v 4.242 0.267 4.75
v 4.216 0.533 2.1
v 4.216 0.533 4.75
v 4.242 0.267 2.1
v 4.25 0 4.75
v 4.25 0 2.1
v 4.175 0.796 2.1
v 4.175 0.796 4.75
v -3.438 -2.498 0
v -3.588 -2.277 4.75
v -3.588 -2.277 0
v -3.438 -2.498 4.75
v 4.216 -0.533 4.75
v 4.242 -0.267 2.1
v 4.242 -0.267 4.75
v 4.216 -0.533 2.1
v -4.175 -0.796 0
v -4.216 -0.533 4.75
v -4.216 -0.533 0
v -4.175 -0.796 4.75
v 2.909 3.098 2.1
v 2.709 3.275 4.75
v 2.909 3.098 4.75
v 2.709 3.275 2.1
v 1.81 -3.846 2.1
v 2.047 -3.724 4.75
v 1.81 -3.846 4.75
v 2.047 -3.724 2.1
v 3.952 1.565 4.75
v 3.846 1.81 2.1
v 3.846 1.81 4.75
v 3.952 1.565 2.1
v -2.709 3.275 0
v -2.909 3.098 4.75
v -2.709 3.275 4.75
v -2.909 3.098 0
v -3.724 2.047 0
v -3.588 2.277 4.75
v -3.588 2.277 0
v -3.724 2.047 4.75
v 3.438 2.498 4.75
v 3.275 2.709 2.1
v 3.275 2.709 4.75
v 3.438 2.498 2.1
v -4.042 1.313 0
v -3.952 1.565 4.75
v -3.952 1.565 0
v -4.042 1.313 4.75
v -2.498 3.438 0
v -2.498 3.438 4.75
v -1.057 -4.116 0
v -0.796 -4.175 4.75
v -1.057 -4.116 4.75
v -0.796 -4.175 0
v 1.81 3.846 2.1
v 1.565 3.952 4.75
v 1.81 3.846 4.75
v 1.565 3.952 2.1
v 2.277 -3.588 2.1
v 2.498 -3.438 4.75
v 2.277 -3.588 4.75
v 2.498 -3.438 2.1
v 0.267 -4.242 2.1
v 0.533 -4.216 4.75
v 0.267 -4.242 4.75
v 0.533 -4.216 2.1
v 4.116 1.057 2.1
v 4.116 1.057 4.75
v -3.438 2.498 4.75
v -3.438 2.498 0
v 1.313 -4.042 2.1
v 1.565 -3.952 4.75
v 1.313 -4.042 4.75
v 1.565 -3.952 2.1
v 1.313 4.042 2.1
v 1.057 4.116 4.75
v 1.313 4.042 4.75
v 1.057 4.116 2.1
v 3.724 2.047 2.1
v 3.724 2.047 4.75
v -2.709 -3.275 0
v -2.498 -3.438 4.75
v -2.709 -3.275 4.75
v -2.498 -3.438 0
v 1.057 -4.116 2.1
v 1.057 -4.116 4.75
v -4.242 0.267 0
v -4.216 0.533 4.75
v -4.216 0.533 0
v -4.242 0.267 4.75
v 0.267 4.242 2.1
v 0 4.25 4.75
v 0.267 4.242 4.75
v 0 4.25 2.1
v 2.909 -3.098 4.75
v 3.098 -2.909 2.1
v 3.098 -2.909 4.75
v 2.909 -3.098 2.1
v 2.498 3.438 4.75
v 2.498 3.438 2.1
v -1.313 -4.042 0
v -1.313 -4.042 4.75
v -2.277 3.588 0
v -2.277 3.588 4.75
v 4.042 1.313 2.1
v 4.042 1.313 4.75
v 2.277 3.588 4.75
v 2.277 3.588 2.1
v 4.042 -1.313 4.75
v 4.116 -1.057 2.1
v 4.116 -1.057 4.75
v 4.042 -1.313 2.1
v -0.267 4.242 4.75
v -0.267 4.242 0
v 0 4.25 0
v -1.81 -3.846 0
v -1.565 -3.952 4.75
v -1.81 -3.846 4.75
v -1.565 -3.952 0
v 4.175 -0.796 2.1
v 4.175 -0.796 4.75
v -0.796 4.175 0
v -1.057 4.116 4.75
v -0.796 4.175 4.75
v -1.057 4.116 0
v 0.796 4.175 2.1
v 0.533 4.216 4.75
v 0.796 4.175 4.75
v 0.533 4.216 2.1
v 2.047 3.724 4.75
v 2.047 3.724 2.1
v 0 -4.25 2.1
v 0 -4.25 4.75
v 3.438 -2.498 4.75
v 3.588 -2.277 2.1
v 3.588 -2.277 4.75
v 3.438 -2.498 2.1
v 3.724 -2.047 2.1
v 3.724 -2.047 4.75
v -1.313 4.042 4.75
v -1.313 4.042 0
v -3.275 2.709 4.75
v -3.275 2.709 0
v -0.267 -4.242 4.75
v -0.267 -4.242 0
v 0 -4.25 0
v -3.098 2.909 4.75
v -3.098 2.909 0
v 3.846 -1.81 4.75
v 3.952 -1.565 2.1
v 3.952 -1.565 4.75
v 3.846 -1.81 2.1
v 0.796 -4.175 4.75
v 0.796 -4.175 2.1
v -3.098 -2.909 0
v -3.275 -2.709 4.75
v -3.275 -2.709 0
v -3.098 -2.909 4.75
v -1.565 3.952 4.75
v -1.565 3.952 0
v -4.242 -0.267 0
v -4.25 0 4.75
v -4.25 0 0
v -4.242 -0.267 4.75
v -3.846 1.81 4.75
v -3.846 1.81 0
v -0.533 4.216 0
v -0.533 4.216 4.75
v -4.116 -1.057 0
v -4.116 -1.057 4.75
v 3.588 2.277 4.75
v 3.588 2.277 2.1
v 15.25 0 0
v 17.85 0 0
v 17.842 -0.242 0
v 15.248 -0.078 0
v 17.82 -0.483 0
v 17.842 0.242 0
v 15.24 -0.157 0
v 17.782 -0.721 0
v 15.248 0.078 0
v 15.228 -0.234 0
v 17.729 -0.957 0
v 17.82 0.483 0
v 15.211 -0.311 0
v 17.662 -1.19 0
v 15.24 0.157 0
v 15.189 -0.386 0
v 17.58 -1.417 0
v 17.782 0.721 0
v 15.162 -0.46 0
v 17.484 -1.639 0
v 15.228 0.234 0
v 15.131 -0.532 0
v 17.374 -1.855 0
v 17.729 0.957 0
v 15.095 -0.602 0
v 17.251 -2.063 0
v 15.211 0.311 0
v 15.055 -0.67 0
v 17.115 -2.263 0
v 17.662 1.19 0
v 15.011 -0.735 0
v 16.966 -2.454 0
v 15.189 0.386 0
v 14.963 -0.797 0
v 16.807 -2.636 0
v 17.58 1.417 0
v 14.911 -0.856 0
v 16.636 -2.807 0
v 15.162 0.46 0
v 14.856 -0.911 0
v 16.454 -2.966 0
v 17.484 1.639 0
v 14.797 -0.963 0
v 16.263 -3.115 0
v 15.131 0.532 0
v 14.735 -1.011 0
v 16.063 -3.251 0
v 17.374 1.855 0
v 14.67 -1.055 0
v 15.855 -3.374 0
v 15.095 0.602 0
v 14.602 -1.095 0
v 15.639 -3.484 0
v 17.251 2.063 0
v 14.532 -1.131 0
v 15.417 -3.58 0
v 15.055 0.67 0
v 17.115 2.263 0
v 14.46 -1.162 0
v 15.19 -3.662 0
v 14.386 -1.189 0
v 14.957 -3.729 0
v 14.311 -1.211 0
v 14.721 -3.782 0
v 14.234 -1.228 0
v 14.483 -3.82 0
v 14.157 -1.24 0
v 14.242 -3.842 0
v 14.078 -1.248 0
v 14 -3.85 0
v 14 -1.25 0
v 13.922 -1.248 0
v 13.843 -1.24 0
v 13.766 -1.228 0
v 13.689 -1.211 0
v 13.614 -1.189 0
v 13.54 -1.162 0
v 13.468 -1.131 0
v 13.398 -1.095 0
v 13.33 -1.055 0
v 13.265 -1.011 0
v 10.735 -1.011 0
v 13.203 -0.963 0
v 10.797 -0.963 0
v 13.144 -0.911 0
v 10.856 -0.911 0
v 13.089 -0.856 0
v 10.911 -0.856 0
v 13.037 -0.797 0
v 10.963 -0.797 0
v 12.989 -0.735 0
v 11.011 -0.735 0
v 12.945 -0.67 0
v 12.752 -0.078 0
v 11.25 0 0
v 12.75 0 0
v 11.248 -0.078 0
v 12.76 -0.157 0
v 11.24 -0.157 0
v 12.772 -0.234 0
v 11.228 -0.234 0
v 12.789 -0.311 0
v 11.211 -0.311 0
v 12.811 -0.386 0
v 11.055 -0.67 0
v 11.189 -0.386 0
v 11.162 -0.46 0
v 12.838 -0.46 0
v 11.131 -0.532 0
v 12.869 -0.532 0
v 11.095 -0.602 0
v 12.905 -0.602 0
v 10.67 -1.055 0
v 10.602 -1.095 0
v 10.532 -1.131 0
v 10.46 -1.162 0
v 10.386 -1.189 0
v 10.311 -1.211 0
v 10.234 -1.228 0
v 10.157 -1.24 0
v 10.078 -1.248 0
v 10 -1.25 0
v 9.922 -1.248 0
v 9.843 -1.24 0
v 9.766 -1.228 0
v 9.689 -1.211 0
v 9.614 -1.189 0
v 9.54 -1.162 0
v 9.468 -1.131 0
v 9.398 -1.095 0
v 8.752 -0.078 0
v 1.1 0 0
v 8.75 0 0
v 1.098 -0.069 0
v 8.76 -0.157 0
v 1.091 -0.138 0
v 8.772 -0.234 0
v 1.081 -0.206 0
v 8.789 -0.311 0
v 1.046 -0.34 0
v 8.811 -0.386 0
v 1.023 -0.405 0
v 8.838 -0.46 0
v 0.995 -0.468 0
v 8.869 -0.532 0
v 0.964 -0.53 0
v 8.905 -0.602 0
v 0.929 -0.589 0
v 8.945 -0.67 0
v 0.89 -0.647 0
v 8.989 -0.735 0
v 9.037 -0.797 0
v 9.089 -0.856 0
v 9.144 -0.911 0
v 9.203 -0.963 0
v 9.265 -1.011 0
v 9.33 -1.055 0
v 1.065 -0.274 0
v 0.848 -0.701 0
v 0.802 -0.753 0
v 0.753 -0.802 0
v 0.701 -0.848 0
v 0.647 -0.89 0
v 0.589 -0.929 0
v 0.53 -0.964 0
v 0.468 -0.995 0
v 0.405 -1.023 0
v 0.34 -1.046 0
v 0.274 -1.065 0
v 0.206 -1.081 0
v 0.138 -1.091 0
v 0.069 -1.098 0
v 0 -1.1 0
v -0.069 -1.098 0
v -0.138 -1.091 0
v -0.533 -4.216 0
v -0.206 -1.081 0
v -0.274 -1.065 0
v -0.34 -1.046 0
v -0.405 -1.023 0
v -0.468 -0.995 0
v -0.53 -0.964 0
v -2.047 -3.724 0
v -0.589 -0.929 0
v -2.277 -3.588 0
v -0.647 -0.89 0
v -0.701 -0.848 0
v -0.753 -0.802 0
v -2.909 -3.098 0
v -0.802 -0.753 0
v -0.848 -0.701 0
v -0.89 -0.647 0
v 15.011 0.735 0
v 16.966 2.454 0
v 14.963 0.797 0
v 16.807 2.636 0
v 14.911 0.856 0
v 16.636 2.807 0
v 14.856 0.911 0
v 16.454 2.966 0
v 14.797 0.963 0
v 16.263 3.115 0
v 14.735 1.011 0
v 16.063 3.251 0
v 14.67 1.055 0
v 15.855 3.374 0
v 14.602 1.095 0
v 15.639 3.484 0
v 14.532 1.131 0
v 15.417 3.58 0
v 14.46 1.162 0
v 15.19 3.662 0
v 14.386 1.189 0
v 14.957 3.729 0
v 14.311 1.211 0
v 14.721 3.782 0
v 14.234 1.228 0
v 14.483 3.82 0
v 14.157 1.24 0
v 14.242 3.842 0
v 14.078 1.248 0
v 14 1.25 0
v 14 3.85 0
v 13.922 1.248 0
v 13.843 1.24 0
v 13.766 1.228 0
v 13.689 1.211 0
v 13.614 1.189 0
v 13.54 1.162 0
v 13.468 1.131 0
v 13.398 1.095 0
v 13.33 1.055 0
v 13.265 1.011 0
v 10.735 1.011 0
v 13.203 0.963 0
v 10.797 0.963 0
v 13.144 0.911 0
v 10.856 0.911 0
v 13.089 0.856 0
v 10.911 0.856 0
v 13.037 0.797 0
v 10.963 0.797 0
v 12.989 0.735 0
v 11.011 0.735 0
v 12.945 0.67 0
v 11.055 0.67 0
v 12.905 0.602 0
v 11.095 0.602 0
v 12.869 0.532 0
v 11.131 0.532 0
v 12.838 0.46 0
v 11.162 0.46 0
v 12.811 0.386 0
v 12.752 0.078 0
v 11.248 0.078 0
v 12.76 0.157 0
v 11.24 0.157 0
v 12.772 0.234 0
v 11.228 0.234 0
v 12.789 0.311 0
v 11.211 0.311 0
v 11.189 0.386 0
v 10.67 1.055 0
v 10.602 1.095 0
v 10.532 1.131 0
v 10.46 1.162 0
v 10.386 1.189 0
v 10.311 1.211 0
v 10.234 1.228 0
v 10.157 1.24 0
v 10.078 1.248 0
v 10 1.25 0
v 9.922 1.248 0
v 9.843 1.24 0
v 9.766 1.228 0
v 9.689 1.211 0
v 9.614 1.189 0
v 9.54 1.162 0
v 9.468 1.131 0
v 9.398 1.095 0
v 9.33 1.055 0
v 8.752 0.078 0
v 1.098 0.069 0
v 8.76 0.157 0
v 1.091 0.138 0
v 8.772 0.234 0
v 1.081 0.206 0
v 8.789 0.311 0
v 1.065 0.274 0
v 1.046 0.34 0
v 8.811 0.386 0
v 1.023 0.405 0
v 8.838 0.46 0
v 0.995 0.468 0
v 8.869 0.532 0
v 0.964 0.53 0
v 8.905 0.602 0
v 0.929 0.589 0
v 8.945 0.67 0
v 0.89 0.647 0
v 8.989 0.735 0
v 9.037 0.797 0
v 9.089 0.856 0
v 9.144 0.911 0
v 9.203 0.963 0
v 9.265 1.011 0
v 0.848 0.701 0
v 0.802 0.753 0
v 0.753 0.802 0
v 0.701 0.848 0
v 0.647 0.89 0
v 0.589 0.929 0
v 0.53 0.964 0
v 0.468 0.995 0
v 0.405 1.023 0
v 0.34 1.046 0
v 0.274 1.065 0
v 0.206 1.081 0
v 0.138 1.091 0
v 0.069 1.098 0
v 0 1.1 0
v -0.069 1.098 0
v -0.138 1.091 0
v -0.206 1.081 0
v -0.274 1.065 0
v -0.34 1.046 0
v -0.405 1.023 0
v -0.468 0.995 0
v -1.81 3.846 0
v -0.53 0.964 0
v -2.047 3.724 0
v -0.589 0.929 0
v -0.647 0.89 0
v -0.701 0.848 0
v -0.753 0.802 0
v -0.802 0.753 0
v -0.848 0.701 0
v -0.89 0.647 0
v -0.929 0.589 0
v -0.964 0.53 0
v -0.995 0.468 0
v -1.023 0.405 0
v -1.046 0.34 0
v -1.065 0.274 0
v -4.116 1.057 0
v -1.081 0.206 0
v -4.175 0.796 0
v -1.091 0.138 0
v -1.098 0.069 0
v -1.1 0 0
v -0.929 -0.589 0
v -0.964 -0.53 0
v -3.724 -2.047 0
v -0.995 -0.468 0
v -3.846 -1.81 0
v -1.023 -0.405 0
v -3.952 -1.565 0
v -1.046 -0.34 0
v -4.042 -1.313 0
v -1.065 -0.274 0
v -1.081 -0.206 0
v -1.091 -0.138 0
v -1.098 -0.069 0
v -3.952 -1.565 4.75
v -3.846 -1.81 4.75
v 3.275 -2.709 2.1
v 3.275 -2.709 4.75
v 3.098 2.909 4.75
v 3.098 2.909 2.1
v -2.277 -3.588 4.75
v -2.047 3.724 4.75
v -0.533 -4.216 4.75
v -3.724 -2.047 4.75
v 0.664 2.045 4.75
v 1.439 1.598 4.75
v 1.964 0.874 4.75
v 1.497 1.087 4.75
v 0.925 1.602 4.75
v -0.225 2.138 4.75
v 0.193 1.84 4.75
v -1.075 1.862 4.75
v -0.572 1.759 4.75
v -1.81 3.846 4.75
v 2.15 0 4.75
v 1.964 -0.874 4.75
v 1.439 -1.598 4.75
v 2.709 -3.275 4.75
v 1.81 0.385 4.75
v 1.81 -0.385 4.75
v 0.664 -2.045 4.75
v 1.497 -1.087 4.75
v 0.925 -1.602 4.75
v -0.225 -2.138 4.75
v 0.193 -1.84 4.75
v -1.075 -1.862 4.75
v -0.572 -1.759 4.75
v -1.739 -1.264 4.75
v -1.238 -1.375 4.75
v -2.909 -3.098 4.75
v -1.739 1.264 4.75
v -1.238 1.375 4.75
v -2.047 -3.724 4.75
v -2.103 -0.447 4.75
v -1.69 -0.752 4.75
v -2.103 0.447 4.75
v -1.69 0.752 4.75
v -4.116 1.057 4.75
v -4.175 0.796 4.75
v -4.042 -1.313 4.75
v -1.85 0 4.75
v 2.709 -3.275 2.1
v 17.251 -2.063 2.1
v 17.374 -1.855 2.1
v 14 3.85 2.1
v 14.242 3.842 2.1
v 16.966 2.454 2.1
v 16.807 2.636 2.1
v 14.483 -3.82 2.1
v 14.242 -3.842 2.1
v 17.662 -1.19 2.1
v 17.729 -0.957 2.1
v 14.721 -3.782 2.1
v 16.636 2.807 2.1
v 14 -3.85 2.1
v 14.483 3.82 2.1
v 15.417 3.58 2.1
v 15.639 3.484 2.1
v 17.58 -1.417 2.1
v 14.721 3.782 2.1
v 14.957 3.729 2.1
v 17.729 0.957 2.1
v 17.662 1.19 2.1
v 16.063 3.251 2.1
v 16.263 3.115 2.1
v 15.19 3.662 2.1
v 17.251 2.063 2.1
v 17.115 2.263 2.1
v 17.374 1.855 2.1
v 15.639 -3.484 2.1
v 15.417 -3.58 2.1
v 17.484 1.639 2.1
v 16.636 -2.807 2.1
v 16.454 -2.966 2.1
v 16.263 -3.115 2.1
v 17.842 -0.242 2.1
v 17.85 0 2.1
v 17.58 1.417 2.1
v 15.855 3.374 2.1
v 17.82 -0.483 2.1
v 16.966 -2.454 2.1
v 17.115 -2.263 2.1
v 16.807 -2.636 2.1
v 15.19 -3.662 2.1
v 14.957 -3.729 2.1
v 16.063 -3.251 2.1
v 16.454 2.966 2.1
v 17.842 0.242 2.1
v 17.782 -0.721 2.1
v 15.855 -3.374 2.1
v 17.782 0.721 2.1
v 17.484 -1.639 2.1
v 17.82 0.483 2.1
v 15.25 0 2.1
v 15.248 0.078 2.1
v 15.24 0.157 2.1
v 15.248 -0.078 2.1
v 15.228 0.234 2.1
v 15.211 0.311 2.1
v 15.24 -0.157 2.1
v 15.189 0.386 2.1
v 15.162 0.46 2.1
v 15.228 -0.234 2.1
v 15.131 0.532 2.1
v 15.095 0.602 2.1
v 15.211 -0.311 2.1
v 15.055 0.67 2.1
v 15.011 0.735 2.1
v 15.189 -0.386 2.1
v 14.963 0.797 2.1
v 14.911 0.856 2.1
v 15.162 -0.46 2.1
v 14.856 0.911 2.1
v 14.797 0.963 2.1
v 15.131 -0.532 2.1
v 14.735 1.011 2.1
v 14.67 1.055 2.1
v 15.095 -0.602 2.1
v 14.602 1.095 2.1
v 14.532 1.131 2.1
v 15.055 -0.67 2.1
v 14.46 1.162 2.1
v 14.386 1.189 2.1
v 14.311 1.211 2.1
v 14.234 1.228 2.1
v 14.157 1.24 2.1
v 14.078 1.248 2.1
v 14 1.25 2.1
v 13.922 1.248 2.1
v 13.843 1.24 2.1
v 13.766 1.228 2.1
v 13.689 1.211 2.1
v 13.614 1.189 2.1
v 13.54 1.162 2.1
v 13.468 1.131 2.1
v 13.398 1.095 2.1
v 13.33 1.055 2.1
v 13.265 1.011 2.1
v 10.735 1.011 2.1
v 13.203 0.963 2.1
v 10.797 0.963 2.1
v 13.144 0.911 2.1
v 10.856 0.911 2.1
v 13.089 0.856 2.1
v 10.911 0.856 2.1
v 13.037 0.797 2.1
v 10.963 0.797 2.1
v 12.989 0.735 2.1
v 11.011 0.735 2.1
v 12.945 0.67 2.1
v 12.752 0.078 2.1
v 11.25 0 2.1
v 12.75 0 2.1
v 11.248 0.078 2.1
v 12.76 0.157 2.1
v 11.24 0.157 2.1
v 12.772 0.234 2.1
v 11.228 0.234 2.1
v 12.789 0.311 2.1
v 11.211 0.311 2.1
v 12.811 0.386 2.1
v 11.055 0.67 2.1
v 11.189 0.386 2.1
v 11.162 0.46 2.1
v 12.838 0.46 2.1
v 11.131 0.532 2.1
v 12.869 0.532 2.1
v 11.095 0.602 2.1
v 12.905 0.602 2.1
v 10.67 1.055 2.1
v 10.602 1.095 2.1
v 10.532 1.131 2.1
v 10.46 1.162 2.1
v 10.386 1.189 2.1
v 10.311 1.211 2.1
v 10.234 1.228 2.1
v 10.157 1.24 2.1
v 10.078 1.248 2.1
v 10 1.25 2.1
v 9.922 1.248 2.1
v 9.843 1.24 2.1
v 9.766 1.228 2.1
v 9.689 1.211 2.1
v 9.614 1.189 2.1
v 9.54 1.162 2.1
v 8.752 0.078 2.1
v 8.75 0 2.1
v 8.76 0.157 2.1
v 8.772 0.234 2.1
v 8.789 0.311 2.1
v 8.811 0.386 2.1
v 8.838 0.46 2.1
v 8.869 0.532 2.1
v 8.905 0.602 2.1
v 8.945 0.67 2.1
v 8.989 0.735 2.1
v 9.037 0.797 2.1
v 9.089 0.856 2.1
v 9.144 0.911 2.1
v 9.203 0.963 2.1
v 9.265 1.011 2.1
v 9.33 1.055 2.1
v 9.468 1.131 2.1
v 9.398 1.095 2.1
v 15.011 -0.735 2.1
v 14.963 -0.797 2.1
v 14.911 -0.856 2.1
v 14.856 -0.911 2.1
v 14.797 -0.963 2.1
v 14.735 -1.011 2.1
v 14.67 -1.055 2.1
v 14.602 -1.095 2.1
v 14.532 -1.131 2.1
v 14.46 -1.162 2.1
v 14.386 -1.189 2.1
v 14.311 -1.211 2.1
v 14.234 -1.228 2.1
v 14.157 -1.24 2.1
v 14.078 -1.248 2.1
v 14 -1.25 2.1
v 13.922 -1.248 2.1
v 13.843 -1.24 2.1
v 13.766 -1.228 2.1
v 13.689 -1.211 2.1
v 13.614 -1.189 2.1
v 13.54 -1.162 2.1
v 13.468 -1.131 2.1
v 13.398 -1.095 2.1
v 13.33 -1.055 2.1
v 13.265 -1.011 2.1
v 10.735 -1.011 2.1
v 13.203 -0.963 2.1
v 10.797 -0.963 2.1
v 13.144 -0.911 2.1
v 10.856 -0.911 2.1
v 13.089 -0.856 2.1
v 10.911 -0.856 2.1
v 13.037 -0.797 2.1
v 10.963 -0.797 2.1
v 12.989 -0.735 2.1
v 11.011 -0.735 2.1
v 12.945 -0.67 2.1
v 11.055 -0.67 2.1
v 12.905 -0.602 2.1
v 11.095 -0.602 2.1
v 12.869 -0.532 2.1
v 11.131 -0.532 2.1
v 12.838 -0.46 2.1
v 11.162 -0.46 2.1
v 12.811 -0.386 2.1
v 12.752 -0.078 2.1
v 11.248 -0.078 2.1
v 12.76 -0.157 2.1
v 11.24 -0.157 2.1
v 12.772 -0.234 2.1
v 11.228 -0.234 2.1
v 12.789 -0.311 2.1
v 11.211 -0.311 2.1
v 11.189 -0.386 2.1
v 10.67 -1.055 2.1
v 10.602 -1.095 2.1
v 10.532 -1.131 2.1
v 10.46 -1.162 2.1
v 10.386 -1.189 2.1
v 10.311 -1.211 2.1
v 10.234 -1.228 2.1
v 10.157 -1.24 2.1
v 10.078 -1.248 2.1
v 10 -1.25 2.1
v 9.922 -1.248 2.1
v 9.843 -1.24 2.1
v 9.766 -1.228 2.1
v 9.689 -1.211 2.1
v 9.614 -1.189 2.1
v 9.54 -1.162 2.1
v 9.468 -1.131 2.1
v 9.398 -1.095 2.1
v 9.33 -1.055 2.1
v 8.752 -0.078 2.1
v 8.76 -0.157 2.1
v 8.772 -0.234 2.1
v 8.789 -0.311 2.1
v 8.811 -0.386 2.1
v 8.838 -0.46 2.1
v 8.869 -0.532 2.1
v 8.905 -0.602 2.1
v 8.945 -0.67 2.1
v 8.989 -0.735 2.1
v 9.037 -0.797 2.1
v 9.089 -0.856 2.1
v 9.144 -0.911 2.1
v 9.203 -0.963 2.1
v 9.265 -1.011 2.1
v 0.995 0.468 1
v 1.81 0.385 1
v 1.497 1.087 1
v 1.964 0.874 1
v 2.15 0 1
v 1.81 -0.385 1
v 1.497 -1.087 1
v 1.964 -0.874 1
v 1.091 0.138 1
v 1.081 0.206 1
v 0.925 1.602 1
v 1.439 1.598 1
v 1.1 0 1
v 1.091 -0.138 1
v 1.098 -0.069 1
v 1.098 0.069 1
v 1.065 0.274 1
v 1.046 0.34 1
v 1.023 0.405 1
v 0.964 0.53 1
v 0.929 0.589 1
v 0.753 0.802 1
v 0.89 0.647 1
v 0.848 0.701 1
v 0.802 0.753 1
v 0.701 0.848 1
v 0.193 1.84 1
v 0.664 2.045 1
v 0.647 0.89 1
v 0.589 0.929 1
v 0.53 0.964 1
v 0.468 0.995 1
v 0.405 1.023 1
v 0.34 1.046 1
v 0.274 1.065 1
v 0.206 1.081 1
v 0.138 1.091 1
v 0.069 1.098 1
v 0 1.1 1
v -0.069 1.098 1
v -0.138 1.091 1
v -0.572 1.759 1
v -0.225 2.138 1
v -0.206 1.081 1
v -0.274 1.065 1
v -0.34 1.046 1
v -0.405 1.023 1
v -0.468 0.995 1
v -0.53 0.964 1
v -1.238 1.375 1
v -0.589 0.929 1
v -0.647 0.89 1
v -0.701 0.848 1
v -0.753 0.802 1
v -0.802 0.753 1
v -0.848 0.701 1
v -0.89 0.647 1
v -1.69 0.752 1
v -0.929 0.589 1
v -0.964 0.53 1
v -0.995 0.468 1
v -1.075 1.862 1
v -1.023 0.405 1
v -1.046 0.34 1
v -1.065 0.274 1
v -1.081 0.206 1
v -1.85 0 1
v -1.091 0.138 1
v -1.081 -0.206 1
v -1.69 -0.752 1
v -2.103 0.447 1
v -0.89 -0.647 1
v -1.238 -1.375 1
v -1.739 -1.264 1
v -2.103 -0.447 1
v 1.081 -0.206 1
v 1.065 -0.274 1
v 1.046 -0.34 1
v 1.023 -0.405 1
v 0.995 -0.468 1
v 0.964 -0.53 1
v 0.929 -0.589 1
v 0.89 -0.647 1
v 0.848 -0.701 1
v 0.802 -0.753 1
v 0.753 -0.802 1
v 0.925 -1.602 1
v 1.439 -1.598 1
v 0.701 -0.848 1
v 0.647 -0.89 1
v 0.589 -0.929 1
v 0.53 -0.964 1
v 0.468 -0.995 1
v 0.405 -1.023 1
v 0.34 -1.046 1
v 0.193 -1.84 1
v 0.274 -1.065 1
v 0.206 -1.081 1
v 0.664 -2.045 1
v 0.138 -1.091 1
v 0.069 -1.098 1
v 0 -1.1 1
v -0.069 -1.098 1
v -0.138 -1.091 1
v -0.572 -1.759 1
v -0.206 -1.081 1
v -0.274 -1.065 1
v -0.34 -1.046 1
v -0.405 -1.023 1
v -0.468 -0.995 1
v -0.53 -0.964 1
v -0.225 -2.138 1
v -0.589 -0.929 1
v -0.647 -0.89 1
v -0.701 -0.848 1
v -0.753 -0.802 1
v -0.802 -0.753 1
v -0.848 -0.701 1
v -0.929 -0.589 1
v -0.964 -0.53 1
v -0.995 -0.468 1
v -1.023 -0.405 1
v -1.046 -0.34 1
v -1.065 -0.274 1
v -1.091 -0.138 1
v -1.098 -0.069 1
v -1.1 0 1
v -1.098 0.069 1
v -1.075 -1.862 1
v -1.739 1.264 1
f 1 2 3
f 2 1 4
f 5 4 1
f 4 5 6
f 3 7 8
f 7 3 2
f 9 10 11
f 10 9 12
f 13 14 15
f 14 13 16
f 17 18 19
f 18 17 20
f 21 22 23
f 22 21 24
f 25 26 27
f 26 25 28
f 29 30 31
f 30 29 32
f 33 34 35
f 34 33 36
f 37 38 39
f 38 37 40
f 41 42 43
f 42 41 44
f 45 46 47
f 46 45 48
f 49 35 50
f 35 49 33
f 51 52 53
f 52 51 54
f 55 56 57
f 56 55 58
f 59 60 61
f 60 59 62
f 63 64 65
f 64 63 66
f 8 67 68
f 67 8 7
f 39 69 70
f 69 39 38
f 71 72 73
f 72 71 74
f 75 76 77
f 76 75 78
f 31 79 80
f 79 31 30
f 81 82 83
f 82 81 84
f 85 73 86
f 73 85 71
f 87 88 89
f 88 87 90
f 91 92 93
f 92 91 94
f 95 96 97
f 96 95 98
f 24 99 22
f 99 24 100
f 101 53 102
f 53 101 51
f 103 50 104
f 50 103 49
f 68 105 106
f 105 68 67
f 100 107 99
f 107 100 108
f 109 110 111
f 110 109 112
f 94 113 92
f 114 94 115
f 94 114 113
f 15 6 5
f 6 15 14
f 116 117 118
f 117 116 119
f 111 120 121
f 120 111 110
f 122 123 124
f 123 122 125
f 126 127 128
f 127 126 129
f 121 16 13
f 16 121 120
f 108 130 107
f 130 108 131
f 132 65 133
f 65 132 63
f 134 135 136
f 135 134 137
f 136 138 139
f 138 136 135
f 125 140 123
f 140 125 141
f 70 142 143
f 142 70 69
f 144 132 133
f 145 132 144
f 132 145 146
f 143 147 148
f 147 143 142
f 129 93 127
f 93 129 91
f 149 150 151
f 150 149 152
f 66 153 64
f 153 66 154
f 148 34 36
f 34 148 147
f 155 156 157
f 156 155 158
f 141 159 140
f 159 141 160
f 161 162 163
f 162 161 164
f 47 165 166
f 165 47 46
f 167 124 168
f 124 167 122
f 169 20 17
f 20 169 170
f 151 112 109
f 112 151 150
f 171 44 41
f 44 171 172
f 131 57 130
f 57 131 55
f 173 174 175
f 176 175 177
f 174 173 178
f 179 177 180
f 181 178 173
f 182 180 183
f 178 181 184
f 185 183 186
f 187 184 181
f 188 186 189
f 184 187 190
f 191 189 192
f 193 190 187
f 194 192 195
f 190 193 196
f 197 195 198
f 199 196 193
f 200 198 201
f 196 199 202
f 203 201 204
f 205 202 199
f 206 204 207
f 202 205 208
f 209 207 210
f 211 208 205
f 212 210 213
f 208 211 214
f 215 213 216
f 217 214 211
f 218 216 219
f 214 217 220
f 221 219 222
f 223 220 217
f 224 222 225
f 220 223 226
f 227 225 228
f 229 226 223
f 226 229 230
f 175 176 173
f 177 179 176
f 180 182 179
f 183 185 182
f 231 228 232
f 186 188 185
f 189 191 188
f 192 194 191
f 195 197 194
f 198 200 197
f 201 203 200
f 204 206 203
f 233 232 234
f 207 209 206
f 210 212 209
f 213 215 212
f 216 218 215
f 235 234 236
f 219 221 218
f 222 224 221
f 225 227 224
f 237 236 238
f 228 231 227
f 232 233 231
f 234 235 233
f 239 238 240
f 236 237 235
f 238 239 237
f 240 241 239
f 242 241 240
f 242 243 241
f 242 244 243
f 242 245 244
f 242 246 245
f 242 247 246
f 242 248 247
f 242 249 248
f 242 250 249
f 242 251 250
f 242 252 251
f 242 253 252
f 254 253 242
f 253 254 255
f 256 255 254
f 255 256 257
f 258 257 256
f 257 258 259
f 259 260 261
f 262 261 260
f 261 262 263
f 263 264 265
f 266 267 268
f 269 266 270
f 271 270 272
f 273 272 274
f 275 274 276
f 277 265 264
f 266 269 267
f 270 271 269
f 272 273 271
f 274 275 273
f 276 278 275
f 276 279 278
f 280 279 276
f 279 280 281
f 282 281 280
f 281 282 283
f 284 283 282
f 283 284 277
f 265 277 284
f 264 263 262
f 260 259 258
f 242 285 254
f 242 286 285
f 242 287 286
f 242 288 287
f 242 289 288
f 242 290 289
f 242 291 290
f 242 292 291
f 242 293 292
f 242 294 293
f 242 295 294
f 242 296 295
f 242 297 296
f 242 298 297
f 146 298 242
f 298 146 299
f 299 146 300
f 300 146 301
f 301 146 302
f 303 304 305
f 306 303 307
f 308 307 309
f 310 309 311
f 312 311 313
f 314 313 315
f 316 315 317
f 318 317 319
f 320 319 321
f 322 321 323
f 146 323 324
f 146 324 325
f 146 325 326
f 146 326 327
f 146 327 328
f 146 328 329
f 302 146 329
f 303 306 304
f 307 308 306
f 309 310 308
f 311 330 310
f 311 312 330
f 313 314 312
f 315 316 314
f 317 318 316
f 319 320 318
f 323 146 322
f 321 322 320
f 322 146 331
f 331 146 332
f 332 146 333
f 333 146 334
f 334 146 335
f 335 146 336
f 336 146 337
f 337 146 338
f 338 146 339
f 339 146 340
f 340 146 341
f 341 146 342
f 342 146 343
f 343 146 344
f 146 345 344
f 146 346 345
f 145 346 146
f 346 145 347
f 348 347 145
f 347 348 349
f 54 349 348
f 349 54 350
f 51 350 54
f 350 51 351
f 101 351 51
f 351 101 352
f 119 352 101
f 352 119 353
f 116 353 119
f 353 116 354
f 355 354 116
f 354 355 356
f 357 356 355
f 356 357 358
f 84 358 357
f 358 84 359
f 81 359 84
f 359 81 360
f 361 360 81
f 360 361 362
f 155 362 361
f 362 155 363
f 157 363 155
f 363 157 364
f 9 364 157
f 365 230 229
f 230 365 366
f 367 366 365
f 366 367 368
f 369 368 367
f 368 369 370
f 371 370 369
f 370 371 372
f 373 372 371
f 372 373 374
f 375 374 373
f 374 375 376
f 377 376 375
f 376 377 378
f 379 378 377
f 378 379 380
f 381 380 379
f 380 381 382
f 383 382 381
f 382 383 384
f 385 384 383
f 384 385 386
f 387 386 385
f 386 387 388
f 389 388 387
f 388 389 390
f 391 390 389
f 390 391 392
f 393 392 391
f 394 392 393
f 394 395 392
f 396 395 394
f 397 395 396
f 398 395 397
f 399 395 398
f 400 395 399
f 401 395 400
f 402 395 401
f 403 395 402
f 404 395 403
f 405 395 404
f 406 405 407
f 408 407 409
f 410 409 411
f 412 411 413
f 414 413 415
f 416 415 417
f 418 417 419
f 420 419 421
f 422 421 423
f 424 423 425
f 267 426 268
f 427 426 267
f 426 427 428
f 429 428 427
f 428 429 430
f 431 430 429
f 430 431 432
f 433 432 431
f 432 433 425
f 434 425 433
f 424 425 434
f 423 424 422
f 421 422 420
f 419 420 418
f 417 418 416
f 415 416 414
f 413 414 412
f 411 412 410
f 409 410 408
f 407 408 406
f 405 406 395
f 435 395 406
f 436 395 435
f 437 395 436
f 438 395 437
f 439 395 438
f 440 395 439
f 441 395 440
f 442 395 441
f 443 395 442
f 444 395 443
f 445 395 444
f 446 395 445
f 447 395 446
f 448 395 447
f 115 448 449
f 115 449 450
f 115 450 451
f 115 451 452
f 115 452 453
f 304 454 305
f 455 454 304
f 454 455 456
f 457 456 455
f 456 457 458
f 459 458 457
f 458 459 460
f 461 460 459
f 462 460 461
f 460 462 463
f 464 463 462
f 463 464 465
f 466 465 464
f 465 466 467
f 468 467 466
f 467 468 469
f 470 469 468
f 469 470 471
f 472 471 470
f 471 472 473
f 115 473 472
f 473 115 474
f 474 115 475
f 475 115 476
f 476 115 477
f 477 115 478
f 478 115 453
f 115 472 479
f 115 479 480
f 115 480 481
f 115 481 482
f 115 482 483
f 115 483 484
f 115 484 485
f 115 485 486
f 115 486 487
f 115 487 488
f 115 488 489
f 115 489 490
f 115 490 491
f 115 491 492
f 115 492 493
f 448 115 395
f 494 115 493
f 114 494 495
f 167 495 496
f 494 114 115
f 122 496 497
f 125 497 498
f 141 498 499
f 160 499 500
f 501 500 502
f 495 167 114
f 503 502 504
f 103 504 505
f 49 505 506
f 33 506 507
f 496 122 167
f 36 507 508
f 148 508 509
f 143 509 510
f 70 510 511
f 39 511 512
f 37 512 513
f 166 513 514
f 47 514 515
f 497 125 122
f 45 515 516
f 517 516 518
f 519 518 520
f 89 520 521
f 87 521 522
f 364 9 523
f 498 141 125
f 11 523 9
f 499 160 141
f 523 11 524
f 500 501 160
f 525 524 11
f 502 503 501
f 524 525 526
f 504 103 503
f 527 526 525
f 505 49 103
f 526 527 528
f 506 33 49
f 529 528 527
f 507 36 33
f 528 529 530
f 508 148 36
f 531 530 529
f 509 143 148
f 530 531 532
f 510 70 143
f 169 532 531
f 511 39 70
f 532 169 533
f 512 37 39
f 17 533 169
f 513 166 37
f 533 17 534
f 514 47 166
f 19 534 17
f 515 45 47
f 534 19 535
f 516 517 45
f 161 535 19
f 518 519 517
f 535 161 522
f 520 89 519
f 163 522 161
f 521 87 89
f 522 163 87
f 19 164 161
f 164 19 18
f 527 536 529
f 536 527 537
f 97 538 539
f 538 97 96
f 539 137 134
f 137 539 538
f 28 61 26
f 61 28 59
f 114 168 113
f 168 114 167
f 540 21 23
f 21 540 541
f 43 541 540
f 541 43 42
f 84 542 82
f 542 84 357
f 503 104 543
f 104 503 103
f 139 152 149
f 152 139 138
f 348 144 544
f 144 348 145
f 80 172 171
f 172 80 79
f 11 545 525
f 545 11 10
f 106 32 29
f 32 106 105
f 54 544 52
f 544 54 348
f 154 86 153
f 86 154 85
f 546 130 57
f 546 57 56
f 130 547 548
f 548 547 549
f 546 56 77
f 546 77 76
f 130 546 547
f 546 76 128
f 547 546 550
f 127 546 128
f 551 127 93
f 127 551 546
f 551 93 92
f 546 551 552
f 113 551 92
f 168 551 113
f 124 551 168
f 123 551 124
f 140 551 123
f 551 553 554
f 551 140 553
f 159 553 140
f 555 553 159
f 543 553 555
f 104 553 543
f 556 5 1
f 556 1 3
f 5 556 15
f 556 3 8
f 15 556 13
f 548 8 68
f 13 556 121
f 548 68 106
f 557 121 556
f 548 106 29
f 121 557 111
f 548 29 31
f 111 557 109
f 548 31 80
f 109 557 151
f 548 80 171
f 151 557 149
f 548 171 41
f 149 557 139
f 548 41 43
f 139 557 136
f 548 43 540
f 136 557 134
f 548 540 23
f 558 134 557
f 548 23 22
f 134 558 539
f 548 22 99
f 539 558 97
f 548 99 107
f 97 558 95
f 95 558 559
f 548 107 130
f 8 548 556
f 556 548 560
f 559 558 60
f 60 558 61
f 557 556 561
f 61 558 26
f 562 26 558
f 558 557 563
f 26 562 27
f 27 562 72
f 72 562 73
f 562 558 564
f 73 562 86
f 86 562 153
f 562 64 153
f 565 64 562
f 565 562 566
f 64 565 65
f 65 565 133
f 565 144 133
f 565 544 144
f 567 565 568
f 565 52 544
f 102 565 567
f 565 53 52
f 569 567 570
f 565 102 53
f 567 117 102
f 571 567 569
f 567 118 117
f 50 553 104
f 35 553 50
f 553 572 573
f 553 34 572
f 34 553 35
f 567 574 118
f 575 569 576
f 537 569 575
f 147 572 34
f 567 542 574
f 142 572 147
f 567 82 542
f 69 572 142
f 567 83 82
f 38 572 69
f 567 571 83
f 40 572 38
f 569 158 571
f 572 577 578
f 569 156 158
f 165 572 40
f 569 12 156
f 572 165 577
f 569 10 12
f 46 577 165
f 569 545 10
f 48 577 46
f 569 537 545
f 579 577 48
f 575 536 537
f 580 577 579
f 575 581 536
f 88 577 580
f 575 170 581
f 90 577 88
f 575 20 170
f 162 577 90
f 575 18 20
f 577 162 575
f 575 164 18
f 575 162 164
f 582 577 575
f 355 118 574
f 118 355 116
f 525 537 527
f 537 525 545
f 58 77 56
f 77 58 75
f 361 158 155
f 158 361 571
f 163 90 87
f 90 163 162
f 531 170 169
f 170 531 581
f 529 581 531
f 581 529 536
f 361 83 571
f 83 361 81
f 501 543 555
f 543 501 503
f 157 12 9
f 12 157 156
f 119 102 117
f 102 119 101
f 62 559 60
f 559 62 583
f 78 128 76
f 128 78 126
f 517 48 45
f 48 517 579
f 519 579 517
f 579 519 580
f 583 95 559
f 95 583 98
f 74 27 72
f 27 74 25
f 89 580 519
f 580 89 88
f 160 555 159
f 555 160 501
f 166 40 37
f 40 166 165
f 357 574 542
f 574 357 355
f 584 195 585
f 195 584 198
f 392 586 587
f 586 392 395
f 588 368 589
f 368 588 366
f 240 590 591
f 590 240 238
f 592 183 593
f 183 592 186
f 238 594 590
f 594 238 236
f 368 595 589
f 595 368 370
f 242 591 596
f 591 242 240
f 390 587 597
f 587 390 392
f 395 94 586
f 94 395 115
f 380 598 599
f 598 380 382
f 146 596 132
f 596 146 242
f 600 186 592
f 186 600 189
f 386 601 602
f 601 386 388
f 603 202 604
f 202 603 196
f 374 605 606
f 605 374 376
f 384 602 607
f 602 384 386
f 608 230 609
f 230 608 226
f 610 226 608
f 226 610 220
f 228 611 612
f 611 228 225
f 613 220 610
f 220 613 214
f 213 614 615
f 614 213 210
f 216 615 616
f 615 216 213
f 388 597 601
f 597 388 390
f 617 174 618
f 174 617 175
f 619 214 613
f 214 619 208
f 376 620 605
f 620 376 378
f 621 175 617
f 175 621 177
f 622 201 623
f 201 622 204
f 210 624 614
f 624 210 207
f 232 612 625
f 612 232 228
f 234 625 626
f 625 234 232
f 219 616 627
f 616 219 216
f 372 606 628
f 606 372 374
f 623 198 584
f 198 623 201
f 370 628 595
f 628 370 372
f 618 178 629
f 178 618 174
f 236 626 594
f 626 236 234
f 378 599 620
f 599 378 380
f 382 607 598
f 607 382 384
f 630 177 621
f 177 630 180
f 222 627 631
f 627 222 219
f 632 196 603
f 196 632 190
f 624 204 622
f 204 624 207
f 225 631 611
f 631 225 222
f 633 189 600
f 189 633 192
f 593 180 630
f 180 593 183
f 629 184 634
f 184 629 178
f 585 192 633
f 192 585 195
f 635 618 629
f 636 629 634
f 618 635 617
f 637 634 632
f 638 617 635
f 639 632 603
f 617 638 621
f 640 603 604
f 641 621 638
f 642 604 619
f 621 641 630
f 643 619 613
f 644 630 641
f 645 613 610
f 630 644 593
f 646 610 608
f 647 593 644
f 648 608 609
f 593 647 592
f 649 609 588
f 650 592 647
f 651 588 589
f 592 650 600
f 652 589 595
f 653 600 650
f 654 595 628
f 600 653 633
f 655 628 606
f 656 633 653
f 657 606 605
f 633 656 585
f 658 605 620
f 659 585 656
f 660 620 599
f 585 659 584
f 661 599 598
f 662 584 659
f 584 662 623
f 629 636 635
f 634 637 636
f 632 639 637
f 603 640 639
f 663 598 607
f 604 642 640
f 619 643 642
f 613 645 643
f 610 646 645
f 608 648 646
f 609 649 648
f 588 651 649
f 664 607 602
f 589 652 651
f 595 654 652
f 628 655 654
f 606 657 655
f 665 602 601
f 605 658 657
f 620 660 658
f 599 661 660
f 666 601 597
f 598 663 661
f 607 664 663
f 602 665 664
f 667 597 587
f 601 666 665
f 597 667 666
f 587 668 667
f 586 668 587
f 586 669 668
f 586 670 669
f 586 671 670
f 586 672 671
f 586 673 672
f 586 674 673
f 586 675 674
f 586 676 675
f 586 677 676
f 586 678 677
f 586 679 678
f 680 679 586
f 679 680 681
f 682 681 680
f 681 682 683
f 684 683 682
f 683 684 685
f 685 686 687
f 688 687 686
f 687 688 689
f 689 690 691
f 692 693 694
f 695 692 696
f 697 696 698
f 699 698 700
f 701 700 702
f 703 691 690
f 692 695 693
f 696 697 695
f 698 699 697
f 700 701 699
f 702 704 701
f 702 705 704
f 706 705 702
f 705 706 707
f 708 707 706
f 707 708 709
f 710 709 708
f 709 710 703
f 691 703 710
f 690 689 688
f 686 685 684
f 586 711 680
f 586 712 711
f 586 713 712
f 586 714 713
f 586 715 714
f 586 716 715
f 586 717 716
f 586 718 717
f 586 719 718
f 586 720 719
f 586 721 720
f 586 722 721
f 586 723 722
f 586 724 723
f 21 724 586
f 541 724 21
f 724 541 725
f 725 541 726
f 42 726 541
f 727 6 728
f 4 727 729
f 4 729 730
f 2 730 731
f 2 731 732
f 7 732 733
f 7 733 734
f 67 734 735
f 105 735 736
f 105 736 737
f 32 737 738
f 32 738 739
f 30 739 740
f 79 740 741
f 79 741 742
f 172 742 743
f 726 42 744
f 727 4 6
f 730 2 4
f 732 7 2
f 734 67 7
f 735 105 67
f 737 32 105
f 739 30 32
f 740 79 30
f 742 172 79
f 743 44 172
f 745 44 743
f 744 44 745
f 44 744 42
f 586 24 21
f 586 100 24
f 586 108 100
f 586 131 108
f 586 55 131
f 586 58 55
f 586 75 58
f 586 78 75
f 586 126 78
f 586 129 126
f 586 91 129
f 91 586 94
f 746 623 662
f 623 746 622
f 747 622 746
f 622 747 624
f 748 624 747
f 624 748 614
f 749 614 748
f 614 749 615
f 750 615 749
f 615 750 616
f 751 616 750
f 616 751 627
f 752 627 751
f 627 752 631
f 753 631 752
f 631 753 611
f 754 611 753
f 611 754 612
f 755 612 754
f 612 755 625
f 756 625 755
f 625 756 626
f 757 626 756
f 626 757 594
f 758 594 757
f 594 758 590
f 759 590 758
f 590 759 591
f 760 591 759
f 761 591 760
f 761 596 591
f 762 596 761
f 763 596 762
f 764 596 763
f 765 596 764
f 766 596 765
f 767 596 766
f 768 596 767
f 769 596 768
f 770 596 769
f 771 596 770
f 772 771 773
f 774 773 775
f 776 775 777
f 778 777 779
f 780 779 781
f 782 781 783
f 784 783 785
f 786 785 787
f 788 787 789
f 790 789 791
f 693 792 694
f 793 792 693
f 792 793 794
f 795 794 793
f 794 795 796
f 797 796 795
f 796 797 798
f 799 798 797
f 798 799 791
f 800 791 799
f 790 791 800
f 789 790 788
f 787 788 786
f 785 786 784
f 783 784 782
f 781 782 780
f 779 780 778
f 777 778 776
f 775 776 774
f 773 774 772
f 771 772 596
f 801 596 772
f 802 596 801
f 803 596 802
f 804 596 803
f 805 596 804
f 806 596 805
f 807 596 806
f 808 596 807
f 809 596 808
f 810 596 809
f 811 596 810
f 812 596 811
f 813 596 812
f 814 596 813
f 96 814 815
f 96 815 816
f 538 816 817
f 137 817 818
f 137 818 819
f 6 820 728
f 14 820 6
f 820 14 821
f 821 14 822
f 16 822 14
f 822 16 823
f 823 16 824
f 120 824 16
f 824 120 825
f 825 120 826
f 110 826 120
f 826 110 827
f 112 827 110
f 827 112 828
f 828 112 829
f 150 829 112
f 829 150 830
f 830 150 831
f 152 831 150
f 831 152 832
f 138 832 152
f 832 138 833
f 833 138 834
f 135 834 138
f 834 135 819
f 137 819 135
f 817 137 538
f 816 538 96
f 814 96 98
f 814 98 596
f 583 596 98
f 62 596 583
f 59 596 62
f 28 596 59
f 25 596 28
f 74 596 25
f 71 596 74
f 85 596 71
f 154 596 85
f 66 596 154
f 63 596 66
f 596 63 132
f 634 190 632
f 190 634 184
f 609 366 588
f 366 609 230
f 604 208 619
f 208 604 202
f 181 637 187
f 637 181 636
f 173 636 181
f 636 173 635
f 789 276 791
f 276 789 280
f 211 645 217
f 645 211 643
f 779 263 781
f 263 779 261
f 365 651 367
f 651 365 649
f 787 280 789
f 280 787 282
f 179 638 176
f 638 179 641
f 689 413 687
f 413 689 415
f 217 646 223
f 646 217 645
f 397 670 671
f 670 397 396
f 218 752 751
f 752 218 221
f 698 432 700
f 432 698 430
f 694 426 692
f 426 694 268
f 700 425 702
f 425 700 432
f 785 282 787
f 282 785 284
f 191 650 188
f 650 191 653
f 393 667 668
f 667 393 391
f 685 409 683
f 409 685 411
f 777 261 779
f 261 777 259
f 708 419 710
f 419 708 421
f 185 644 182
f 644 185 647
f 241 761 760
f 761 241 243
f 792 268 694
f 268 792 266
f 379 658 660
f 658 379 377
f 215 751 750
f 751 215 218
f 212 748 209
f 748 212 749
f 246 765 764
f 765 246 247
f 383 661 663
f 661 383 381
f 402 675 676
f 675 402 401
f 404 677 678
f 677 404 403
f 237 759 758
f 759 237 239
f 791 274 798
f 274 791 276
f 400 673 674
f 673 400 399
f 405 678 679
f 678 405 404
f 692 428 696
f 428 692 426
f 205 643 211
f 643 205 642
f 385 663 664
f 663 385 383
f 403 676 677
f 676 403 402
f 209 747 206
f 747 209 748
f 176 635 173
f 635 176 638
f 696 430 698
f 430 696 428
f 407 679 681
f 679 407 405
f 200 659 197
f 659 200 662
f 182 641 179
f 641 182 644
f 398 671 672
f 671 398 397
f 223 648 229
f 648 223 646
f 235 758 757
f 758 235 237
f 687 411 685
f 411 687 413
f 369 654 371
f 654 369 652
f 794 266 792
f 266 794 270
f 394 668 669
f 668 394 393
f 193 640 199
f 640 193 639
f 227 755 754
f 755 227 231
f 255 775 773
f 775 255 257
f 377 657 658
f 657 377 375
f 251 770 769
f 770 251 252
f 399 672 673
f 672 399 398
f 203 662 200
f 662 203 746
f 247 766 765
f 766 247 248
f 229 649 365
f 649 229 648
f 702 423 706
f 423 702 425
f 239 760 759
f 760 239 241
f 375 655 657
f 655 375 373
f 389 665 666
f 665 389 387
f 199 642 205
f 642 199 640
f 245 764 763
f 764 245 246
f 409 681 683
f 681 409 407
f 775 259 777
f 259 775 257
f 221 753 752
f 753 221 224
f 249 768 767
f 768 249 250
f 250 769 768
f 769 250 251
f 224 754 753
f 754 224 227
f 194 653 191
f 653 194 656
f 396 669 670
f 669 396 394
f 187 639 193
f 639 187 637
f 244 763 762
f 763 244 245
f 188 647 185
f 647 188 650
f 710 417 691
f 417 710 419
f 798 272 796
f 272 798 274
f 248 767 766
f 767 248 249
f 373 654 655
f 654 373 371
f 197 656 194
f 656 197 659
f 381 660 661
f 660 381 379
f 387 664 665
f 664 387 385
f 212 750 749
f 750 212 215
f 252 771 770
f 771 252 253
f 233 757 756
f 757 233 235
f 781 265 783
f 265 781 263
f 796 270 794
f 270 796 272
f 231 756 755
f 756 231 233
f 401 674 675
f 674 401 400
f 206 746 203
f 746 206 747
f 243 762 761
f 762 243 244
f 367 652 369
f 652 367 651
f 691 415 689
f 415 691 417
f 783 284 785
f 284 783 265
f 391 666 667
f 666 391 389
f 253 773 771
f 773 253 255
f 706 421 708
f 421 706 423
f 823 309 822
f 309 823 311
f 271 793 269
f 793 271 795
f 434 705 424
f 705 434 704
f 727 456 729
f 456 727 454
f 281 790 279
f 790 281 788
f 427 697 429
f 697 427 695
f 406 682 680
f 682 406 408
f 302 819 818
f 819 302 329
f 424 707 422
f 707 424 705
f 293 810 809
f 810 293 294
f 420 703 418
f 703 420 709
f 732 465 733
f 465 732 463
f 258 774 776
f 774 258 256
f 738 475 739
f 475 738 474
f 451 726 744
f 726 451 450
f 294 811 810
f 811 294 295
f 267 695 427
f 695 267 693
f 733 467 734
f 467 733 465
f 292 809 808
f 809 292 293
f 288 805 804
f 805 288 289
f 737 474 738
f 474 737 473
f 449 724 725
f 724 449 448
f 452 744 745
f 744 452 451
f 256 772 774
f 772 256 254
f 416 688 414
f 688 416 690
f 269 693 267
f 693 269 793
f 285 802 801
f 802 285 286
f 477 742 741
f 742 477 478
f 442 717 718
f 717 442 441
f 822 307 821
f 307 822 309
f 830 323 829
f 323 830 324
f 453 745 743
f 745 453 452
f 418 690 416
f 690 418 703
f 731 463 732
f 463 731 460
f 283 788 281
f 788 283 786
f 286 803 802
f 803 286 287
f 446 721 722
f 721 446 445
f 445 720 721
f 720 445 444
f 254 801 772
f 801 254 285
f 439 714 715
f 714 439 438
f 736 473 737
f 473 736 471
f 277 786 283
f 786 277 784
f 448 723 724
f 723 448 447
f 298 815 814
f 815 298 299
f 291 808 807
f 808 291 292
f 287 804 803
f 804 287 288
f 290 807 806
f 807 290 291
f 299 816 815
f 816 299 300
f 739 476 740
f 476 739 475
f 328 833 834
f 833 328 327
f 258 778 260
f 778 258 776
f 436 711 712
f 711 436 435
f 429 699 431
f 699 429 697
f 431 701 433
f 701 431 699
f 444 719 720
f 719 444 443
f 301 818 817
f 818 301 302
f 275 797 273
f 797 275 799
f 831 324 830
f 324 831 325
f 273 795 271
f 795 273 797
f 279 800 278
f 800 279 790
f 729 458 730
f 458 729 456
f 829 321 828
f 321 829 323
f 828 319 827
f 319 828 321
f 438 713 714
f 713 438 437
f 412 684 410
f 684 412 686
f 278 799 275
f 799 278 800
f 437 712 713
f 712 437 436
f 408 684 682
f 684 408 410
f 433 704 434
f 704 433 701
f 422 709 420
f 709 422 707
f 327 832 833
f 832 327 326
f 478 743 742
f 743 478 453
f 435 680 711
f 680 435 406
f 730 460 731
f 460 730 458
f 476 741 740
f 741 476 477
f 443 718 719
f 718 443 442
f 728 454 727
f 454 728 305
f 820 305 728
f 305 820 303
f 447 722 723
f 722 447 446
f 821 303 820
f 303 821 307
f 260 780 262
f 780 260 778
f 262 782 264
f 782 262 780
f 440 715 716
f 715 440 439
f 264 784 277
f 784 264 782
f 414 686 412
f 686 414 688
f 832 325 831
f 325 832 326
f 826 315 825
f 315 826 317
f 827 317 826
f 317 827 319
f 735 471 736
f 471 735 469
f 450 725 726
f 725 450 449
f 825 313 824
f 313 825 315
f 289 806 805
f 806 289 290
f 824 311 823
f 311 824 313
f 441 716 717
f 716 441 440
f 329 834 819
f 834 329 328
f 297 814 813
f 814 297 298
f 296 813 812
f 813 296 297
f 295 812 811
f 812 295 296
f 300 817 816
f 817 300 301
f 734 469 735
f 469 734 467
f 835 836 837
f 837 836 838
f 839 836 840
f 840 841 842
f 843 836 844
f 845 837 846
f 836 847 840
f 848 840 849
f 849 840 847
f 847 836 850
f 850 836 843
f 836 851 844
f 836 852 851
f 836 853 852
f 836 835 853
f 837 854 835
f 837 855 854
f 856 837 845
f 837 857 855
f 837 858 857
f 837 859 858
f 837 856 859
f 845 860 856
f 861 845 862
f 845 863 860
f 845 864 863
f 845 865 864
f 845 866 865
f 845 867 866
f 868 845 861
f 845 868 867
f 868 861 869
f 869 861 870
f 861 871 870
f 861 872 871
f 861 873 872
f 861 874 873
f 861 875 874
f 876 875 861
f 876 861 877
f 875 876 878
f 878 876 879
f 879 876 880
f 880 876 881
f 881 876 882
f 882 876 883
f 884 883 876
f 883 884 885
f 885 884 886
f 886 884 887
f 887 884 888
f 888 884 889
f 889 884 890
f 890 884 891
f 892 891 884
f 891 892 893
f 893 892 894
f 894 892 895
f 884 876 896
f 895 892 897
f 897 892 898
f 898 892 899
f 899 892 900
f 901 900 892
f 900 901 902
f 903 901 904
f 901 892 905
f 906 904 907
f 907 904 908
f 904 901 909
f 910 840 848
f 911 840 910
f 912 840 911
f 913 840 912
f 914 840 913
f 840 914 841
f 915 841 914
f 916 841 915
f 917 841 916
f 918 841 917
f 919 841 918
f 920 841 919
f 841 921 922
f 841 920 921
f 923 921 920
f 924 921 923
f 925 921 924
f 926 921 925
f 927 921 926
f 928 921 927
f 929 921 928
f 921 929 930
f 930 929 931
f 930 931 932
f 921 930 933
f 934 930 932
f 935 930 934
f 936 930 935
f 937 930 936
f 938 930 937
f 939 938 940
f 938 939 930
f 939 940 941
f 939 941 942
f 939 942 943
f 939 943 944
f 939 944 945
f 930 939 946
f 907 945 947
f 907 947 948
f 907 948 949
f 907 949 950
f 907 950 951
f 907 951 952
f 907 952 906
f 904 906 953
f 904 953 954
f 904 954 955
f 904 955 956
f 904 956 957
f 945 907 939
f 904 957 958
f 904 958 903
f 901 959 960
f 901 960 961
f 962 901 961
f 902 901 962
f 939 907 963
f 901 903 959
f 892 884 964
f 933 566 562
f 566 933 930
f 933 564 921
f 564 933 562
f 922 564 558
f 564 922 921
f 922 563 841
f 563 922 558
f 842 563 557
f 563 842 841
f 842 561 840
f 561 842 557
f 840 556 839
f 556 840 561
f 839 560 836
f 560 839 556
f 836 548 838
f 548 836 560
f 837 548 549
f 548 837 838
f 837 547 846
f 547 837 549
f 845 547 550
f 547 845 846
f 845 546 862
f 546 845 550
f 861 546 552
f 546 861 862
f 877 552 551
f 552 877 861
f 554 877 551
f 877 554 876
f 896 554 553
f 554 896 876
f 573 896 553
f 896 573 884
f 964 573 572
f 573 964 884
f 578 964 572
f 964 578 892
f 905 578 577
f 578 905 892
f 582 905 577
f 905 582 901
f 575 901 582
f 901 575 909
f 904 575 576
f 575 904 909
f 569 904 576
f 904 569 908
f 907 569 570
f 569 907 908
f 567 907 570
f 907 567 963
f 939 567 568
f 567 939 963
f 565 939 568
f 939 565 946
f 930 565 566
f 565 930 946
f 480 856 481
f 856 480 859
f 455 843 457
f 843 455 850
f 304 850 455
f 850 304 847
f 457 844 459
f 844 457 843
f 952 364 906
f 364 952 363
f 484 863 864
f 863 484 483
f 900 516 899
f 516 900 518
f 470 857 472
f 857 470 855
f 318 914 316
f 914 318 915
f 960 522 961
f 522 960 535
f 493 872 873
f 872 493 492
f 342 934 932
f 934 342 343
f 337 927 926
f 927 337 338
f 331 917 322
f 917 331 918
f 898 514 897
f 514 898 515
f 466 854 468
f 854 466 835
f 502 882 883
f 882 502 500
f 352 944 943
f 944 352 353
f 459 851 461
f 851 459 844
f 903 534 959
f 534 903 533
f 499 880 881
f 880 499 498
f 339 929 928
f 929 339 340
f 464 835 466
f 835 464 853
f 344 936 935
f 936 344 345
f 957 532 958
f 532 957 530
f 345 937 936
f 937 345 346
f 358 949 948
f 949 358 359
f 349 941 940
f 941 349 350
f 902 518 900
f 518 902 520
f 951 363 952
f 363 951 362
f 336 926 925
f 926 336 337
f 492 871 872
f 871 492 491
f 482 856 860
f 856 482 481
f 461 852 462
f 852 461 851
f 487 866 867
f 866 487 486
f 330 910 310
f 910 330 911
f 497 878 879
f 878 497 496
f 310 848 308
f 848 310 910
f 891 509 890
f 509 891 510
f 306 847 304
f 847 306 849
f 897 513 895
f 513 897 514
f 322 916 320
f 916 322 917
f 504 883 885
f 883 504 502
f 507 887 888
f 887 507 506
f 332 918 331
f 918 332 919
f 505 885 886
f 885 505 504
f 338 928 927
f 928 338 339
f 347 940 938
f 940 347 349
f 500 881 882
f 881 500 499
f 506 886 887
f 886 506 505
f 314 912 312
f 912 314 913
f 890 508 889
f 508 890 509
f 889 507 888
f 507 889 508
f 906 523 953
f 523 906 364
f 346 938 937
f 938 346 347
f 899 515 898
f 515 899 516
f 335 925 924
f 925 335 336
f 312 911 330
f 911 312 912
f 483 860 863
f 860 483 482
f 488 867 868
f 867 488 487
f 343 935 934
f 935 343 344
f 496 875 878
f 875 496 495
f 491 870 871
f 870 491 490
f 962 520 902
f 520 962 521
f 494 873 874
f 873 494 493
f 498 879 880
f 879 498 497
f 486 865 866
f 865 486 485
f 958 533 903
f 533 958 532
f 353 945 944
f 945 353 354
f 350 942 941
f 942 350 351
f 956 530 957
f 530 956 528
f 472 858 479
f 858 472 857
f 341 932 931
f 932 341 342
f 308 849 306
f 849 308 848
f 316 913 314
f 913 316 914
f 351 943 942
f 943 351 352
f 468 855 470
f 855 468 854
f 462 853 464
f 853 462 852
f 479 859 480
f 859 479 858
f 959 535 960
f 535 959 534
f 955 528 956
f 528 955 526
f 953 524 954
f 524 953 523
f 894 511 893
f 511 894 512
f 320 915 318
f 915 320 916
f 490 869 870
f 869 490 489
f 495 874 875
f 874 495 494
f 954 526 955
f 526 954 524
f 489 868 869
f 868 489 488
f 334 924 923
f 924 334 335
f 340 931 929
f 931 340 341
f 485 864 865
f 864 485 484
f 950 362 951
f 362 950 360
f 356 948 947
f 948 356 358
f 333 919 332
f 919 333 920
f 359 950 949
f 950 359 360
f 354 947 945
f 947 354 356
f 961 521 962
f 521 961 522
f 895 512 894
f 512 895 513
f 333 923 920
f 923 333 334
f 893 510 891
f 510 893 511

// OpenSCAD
// =============================================================================
// PROJECT: WH-SERVO-INTERFACE - v1.6
// LICENSE: Creative Commons Zero (CC0) / Public Domain
// AUTHOR: Weston Hinton (2026)
// DESCRIPTION: Servo horn engine featuring adjustable bottom floor thickness
//              to control exactly how deep the retaining screw seats into the shaft.
// =============================================================================
/* =============================================================================
   SPLINE REFERENCE CHART (Use these values to populate parameters below)
   =============================================================================
   SERVO TYPE / PRESET             | TEETH (T) | OUTER DIA (mm) | CAVITY DEPTH (mm)
   --------------------------------+-----------+----------------+------------------
   EMAX ES08MA II / ES08MD II      |    15     |      4.0       |       3.75
   Futaba Standard (MKS, Savox)    |    25     |      5.92      |       4.0
   Futaba Micro (1F Spec)          |    15     |      4.0       |       3.75
   Futaba Mini (2F Spec)           |    21     |      4.5       |       4.0
   Hitec Standard (C1 Spec)        |    24     |      5.76      |       4.0
   Hitec Sub-Micro (A1 Spec)       |    15     |      3.9       |       3.2
   Standard SG90 9g (Clone)        |    21     |      4.9       |       3.2
   TowerPro SG90 9g (Genuine)      |    21     |      4.7       |       3.2
   =============================================================================
*/

/* [1. Horn Style Options] */
// 1: Spoke Arms (uses 'arm_count'), 2: Full Circular Disc
horn_style       = 1;     
// Number of arms to generate (1 to 4) - Only used if horn_style is 1
arm_count        = 1;     

/* [2. Linkage Variables] */
horn_length      = 14.0;  // Center of spline to furthest attachment hole (or Disc Radius)
horn_thickness   = 2.1;   // Thickness of the output arms/disc
hole_spacing     = 4.0;   // Distance between linkage holes
hole_diameter    = 2.5;   // Diameter for clevis/pushrod pins

/* [3. FDM Optimization] */
// Minimum material thickness around the linkage holes (radial padding)
hole_padding     = 2.6;   // Increase for higher structural strength

/* [4. Spline Interface Configuration] */
spline_teeth        = 15;    // Number of teeth 
spline_outer_dia    = 4.0;   // Major (outer) diameter of output shaft
spline_depth        = 3.75;  // Total depth of engagement cavity
retaining_screw_dia = 2.2;   // Center screw hole diameter
fit_tolerance       = 0.15;  // Material compensation (0.15 - 0.20 for PETG-CF)

/* [5. Fastener Engagement Control] */
// Thickness of solid plastic between the bottom bed surface and start of splines
screw_floor_thickness = 1.0;  // Lower this value to give your screw more thread reach!

/* [Hidden Internal Geometry] */
$fn = 100;
overlap = 0.05; 

r_outer = (spline_outer_dia / 2) + fit_tolerance;
r_inner = r_outer - 0.3; 

tip_diameter = hole_diameter + (hole_padding * 2);
hub_dia = spline_outer_dia + 4.5; 

// Hub height is now dynamically driven by the desired floor thickness
hub_height = spline_depth + screw_floor_thickness;

// =============================================================================
// MAIN ASSEMBLY
// =============================================================================

difference() {
    // 1. SOLID COMPOSITE BODY
    union() {
        // Spline Hub Collar Base
        cylinder(h = hub_height, d = hub_dia);
        
        // Output Geometry Selection
        if (horn_style == 2) {
            // STYLE 2: FULL CONTROL DISC
            cylinder(h = horn_thickness, r = horn_length + hole_padding);
        } else {
            // STYLE 1: MULTI-SPOKE RADIATING ARMS
            if (arm_count > 0 && arm_count <= 4) {
                for (arm = [0 : arm_count - 1]) {
                    rotate([0, 0, arm * (360 / arm_count)]) {
                        hull() {
                            cylinder(h = horn_thickness, d = hub_dia);
                            translate([horn_length, 0, 0])
                                cylinder(h = horn_thickness, d = tip_diameter);
                        }
                    }
                }
            }
        }
    }

    // 2. THE SUBTRACTIVE SPLINE SHAFT
    // Shifts dynamically based on the calculated hub height
    translate([0, 0, hub_height - spline_depth]) {
        linear_extrude(height = spline_depth + overlap) {
            star_polygon(num_teeth = spline_teeth, r1 = r_outer, r2 = r_inner);
        }
    }

    // 3. MAIN CENTER RETAINING SCREW HOLE
    translate([0, 0, -overlap])
        cylinder(h = hub_height + 2*overlap, d = retaining_screw_dia);

    // 4. LINKAGE HOLE ARRAY SUBTRACTION
    if (horn_style == 2) {
        for (rot_angle = [0, 90, 180, 270]) {
            rotate([0, 0, rot_angle]) {
                for (dist = [horn_length : -hole_spacing : hub_dia/2 + hole_padding]) {
                    translate([dist, 0, -overlap])
                        cylinder(h = horn_thickness + 2*overlap, d = hole_diameter);
                }
            }
        }
    } else {
        if (arm_count > 0 && arm_count <= 4) {
            for (arm = [0 : arm_count - 1]) {
                rotate([0, 0, arm * (360 / arm_count)]) {
                    for (dist = [horn_length : -hole_spacing : hub_dia/2 + hole_padding]) {
                        translate([dist, 0, -overlap])
                            cylinder(h = horn_thickness + 2*overlap, d = hole_diameter);
                    }
                }
            }
        }
    }
}

// =============================================================================
// MATHEMATICAL CORE MODULES
// =============================================================================

module star_polygon(num_teeth, r1, r2) {
    count = num_teeth * 2;
    step  = 360 / count;
    
    points = [
        for (i = [0 : count - 1]) 
            let(
                r = (i % 2 == 0) ? r1 : r2,
                angle = i * step
            )
            [ r * cos(angle), r * sin(angle) ]
    ];
    
    polygon(points);
}
